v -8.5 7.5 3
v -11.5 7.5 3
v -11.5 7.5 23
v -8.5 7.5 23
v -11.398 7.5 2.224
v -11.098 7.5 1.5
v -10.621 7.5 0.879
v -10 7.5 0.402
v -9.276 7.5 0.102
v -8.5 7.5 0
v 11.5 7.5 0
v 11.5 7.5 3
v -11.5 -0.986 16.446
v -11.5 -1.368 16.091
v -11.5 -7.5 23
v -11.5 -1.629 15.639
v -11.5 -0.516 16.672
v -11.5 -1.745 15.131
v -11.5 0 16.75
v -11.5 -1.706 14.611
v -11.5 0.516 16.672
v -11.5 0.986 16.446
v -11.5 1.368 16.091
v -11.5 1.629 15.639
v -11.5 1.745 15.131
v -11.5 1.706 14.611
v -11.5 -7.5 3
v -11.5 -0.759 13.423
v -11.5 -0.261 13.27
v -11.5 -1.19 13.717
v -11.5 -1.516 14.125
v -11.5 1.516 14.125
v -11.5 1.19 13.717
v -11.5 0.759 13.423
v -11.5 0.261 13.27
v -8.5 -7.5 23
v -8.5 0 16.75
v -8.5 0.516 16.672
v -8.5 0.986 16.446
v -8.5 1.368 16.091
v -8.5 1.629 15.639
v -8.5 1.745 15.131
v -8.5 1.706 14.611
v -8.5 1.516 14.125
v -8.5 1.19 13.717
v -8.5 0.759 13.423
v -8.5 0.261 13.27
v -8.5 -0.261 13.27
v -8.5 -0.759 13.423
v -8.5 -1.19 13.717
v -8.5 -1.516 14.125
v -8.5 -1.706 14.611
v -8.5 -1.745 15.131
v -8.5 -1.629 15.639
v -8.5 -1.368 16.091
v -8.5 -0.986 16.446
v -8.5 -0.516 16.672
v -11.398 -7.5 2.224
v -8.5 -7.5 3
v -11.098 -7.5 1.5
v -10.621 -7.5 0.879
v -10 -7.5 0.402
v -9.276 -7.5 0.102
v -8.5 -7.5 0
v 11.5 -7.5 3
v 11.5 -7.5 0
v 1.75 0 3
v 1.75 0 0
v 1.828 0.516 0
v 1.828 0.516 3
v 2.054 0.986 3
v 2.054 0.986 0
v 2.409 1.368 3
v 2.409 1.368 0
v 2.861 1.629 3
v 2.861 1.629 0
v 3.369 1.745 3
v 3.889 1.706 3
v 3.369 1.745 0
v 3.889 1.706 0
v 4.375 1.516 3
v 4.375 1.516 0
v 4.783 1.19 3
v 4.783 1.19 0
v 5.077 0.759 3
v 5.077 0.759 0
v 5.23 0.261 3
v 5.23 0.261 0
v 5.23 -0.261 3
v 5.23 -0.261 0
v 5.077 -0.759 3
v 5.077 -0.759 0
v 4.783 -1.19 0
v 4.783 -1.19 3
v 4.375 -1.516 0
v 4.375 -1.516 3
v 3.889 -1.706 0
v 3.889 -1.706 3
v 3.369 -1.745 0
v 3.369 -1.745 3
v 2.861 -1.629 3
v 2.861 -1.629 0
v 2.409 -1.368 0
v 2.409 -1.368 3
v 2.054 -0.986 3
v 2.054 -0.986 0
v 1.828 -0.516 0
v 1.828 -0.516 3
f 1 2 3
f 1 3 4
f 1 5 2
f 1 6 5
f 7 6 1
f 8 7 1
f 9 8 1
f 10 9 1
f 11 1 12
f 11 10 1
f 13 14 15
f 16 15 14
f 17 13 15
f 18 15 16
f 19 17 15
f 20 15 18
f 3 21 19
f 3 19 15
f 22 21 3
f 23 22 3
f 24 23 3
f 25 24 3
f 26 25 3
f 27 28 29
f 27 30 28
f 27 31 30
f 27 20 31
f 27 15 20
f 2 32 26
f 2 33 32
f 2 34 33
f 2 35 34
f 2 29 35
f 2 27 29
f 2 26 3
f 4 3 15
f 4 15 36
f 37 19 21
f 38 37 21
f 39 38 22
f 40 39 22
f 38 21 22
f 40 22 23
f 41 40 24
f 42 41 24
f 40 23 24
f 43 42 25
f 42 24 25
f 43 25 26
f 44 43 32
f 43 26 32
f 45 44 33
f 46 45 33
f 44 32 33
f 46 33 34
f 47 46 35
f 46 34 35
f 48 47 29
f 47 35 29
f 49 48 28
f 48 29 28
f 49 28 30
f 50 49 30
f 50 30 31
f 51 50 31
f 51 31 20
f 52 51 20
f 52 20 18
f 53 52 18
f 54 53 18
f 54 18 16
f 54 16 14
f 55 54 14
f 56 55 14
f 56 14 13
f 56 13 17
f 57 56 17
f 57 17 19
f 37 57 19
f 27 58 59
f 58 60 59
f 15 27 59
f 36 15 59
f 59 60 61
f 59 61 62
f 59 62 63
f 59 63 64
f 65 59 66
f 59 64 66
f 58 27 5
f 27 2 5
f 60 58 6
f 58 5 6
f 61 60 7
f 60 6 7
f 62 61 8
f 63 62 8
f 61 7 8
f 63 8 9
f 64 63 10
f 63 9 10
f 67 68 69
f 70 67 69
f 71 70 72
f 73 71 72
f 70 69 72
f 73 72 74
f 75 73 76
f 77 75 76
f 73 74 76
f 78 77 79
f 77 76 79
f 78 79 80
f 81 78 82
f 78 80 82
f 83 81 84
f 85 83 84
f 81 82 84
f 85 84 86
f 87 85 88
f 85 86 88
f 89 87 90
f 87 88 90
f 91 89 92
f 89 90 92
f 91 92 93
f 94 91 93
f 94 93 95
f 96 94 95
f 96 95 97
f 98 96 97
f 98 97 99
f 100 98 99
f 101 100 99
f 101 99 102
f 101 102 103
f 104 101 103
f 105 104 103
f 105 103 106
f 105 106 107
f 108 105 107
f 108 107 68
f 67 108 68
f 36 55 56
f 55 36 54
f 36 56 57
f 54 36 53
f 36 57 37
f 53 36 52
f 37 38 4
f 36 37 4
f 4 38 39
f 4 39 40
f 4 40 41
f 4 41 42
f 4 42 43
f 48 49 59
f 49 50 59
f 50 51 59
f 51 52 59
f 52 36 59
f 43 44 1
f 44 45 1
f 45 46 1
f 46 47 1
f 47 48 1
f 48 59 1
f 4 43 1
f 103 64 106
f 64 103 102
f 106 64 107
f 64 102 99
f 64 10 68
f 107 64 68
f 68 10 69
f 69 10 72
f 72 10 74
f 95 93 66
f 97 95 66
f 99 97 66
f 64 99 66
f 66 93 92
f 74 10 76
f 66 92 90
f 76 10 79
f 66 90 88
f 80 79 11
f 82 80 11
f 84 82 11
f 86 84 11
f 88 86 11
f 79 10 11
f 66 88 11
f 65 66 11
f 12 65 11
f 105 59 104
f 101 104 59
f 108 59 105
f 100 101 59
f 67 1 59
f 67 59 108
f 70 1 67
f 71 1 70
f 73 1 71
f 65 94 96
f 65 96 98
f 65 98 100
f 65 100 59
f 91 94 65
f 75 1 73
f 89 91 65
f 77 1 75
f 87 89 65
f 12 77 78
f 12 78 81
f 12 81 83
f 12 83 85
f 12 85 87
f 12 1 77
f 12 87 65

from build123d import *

# Parameters (mm, degrees)
SKETCH1_W           = 23
SKETCH1_H           = 15
BOSS_EXTRUDE1_DEPTH = 3
SKETCH10_W          = 3
SKETCH10_H          = 15
BOSS_EXTRUDE2_DEPTH = 20
SKETCH13_R          = 1.75
CUT_EXTRUDE3_DEPTH  = 24
SKETCH14_R          = 1.75
CUT_EXTRUDE4_DEPTH  = 24
FILLET1_R           = 3


with BuildPart() as part:
    # Sketch1 → Boss-Extrude1 (new body)
    with BuildSketch(Plane.XY):
        Rectangle(SKETCH1_W, SKETCH1_H)
    extrude(amount=BOSS_EXTRUDE1_DEPTH)

    # Sketch10 → Boss-Extrude2 (add)
    with BuildSketch(Plane.XY.offset(3)):
        with Locations((-10, 0)):
            Rectangle(SKETCH10_W, SKETCH10_H)
    extrude(amount=BOSS_EXTRUDE2_DEPTH)

    # Sketch13 → Cut-Extrude3 (cut, through all)
    with BuildSketch(Plane(origin=(0, 0, 0), x_dir=(-1, 0, 0), z_dir=(0, 0, -1))):
        with Locations((-3.5, 0)):
            Circle(SKETCH13_R)
    extrude(amount=-CUT_EXTRUDE3_DEPTH, mode=Mode.SUBTRACT)

    # Sketch14 → Cut-Extrude4 (cut, through all)
    with BuildSketch(Plane.ZY.offset(11.5)):
        with Locations((15, 0)):
            Circle(SKETCH14_R)
    extrude(amount=-CUT_EXTRUDE4_DEPTH, mode=Mode.SUBTRACT)

    # Fillet1
    fillet1_edges = [part.edges().sort_by_distance(p)[0] for p in [
        (-11.5, 0, 0),
    ]]
    fillet(fillet1_edges, radius=FILLET1_R)


solid = part.part
